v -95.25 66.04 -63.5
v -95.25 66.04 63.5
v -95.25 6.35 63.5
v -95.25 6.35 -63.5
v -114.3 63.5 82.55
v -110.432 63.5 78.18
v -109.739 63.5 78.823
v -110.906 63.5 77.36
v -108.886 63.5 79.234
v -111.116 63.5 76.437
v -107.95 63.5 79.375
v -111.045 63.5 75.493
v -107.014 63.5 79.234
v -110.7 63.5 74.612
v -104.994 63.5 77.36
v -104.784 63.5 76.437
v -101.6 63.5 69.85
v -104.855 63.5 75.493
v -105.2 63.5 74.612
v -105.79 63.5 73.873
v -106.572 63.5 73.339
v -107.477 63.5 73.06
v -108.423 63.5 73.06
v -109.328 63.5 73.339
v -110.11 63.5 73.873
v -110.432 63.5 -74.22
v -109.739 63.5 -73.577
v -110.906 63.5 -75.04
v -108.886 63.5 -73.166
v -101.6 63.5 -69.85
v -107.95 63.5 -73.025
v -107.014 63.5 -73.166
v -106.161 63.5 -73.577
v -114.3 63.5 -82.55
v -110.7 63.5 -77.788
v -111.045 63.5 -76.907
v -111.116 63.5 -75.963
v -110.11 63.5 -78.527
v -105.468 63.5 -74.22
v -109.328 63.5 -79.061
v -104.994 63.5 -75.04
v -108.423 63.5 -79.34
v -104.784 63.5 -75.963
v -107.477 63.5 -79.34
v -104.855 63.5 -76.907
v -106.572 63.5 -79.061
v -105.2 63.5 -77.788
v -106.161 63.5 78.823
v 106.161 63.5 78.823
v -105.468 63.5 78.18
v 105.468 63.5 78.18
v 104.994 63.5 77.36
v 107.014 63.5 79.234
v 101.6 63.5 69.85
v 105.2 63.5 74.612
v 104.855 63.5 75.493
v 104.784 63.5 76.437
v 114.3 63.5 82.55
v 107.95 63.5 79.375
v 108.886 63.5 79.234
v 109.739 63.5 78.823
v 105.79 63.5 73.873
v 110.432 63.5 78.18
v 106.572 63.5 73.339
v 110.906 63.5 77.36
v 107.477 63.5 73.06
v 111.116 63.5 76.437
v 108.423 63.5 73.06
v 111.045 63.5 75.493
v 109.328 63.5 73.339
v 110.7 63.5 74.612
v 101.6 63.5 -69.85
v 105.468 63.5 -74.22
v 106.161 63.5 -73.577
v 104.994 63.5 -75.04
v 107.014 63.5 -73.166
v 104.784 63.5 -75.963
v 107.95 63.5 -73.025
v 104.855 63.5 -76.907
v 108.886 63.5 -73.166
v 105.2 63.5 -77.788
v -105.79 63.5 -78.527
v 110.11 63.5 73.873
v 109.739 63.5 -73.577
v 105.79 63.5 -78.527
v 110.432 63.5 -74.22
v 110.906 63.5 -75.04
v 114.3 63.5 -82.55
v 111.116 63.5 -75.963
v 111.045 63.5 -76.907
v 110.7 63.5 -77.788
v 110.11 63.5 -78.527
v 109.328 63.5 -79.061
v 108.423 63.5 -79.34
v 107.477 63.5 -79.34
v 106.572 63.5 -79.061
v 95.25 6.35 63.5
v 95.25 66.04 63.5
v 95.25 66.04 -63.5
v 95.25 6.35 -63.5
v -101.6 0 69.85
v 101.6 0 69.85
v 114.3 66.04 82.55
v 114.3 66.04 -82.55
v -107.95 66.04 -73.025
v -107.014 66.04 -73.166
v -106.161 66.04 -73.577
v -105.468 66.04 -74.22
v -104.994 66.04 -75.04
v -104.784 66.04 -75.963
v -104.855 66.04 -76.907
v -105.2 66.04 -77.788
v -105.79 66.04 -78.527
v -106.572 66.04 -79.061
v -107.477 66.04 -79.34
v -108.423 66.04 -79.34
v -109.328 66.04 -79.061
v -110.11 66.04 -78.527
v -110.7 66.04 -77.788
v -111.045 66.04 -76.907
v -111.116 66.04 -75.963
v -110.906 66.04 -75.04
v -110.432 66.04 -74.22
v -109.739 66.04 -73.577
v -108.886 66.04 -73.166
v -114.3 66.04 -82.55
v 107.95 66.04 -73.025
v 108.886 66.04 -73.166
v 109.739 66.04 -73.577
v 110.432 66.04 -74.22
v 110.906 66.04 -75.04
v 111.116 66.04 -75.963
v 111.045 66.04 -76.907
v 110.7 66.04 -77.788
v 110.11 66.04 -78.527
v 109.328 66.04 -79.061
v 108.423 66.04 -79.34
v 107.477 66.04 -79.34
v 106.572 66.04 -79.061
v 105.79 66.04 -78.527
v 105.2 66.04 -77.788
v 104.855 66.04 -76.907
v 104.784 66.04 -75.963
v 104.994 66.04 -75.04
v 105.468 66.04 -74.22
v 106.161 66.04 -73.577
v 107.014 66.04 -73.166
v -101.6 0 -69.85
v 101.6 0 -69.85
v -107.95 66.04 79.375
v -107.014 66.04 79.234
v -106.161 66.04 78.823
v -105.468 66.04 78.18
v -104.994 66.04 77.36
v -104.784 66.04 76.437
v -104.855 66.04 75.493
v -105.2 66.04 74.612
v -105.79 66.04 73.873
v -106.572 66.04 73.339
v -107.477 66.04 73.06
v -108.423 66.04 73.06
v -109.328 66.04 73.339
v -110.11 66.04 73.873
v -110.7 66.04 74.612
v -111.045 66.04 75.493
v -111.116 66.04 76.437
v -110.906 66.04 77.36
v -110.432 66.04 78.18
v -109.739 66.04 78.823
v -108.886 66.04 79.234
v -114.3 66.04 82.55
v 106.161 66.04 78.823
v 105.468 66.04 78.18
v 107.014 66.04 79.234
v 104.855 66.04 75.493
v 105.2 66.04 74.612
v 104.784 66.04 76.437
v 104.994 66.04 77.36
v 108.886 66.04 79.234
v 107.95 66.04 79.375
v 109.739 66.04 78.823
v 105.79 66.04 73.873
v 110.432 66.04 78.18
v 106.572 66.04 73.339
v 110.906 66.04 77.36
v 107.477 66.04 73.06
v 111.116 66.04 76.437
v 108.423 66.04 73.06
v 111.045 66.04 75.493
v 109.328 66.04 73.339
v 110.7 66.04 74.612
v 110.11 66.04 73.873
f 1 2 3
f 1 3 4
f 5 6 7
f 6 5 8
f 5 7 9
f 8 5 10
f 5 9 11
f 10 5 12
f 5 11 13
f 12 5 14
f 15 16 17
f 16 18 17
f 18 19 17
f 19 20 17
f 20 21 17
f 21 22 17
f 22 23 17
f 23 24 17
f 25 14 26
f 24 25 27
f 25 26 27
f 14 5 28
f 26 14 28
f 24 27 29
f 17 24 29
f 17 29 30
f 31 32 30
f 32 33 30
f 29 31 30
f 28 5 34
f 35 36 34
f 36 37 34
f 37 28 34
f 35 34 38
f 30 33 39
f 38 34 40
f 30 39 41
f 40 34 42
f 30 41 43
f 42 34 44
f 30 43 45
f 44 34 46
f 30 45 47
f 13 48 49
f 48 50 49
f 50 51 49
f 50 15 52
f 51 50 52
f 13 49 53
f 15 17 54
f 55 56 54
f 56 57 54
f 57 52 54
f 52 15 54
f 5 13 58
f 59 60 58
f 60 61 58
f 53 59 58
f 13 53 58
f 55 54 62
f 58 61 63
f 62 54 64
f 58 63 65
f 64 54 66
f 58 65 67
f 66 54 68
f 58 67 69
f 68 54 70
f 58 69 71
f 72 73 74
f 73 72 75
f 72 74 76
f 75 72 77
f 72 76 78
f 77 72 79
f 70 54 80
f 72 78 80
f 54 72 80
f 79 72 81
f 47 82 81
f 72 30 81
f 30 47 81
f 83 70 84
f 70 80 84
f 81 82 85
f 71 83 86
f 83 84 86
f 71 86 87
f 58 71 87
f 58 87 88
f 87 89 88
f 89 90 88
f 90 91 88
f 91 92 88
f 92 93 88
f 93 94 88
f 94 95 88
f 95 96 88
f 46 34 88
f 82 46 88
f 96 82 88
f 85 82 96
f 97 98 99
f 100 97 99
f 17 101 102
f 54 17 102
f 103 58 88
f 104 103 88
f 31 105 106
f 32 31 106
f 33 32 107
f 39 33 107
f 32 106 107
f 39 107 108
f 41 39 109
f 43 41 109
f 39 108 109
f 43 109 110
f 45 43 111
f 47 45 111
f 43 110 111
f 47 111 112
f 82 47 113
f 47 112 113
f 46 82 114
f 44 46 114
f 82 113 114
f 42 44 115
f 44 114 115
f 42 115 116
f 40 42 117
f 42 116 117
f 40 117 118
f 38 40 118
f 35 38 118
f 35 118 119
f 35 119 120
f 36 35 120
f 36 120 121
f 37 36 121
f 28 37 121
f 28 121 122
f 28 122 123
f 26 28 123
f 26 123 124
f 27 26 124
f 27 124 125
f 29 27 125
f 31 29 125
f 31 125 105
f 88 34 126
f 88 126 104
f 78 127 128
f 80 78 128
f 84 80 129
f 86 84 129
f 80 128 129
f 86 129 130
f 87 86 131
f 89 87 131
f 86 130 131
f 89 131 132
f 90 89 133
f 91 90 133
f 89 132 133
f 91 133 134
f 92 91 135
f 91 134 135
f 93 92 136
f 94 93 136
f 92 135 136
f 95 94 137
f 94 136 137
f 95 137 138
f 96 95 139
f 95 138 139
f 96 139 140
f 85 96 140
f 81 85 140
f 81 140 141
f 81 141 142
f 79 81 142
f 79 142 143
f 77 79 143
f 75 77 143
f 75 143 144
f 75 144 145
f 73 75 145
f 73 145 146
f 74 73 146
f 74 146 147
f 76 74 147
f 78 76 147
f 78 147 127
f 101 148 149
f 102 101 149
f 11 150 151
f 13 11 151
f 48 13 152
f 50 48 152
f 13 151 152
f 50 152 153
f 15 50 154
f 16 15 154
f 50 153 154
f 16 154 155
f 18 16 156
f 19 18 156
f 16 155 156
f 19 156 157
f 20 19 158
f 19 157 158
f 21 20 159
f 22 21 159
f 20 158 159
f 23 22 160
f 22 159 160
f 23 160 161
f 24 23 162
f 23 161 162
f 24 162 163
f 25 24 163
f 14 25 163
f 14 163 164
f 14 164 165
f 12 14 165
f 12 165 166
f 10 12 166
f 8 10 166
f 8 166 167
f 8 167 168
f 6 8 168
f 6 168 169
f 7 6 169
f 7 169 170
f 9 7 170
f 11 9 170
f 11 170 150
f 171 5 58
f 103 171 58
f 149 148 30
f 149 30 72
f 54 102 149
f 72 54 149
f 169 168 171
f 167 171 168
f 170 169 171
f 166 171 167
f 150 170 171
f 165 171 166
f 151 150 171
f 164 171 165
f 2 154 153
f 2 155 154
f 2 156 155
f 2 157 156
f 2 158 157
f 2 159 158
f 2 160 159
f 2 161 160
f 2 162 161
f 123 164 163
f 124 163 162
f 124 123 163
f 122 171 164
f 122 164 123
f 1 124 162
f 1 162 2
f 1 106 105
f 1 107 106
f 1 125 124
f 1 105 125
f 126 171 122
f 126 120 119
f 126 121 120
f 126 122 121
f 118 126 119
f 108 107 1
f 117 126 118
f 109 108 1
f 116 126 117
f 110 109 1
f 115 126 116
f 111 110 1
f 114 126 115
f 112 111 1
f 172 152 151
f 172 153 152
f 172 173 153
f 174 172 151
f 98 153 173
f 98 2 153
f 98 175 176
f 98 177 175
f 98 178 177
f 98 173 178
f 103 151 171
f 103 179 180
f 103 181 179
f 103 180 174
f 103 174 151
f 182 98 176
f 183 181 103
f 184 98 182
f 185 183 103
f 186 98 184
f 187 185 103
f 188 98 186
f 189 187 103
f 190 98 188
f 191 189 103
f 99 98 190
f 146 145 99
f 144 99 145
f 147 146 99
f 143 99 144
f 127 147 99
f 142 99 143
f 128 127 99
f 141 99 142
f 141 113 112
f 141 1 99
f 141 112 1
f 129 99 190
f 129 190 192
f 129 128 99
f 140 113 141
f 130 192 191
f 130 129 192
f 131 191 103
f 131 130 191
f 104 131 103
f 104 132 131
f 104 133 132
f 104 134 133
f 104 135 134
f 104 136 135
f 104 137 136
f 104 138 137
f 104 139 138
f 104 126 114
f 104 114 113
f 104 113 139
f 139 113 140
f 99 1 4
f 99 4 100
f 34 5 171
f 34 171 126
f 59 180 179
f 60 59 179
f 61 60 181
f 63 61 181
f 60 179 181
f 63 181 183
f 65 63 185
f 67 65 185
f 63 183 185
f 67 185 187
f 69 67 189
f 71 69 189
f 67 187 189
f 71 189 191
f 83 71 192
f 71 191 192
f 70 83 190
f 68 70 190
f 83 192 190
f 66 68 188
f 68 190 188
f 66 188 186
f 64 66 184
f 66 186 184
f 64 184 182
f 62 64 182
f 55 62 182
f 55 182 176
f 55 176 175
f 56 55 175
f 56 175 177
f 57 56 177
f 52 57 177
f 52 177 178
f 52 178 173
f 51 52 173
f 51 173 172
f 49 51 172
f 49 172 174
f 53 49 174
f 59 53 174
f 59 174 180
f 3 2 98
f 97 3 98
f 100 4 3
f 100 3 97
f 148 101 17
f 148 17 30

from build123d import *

# Parameters (mm, degrees)
SKETCH1_W                   = 203.2
SKETCH1_H                   = 139.7
BOSS_EXTRUDE2_DEPTH         = 63.5
SKETCH3_W                   = 228.6
SKETCH3_H                   = 165.1
BOSS_EXTRUDE3_DEPTH         = 2.54
F_1_4_0_25_DIAMETER_HOLE1_D = 6.35
SKETCH10_W                  = 190.5
SKETCH10_H                  = 127
CUT_EXTRUDE1_DEPTH          = 59.69


with BuildPart() as part:
    # Sketch1 → Boss-Extrude2 (new body)
    with BuildSketch(Plane(origin=(0, 0, 0), x_dir=(1, 0, 0), z_dir=(0, 1, 0))):
        Rectangle(SKETCH1_W, SKETCH1_H)
    extrude(amount=BOSS_EXTRUDE2_DEPTH)

    # Sketch3 → Boss-Extrude3 (add)
    with BuildSketch(Plane(origin=(0, 63.5, 0), x_dir=(1, 0, 0), z_dir=(0, 1, 0))):
        Rectangle(SKETCH3_W, SKETCH3_H)
    extrude(amount=BOSS_EXTRUDE3_DEPTH)

    # 1/4 (0.25) Diameter Hole1 (through all)
    with Locations(Plane(origin=(107.95, 63.5, -76.2), x_dir=(0, 0, -1), z_dir=(0, -1, 0))):
        with Locations((0, 0), (-152.4, 0), (0, -215.9), (-152.4, -215.9)):
            Hole(F_1_4_0_25_DIAMETER_HOLE1_D / 2)

    # Sketch10 → Cut-Extrude1 (cut)
    with BuildSketch(Plane(origin=(0, 66.04, 0), x_dir=(1, 0, 0), z_dir=(0, 1, 0))):
        Rectangle(SKETCH10_W, SKETCH10_H)
    extrude(amount=-CUT_EXTRUDE1_DEPTH, mode=Mode.SUBTRACT)


solid = part.part
